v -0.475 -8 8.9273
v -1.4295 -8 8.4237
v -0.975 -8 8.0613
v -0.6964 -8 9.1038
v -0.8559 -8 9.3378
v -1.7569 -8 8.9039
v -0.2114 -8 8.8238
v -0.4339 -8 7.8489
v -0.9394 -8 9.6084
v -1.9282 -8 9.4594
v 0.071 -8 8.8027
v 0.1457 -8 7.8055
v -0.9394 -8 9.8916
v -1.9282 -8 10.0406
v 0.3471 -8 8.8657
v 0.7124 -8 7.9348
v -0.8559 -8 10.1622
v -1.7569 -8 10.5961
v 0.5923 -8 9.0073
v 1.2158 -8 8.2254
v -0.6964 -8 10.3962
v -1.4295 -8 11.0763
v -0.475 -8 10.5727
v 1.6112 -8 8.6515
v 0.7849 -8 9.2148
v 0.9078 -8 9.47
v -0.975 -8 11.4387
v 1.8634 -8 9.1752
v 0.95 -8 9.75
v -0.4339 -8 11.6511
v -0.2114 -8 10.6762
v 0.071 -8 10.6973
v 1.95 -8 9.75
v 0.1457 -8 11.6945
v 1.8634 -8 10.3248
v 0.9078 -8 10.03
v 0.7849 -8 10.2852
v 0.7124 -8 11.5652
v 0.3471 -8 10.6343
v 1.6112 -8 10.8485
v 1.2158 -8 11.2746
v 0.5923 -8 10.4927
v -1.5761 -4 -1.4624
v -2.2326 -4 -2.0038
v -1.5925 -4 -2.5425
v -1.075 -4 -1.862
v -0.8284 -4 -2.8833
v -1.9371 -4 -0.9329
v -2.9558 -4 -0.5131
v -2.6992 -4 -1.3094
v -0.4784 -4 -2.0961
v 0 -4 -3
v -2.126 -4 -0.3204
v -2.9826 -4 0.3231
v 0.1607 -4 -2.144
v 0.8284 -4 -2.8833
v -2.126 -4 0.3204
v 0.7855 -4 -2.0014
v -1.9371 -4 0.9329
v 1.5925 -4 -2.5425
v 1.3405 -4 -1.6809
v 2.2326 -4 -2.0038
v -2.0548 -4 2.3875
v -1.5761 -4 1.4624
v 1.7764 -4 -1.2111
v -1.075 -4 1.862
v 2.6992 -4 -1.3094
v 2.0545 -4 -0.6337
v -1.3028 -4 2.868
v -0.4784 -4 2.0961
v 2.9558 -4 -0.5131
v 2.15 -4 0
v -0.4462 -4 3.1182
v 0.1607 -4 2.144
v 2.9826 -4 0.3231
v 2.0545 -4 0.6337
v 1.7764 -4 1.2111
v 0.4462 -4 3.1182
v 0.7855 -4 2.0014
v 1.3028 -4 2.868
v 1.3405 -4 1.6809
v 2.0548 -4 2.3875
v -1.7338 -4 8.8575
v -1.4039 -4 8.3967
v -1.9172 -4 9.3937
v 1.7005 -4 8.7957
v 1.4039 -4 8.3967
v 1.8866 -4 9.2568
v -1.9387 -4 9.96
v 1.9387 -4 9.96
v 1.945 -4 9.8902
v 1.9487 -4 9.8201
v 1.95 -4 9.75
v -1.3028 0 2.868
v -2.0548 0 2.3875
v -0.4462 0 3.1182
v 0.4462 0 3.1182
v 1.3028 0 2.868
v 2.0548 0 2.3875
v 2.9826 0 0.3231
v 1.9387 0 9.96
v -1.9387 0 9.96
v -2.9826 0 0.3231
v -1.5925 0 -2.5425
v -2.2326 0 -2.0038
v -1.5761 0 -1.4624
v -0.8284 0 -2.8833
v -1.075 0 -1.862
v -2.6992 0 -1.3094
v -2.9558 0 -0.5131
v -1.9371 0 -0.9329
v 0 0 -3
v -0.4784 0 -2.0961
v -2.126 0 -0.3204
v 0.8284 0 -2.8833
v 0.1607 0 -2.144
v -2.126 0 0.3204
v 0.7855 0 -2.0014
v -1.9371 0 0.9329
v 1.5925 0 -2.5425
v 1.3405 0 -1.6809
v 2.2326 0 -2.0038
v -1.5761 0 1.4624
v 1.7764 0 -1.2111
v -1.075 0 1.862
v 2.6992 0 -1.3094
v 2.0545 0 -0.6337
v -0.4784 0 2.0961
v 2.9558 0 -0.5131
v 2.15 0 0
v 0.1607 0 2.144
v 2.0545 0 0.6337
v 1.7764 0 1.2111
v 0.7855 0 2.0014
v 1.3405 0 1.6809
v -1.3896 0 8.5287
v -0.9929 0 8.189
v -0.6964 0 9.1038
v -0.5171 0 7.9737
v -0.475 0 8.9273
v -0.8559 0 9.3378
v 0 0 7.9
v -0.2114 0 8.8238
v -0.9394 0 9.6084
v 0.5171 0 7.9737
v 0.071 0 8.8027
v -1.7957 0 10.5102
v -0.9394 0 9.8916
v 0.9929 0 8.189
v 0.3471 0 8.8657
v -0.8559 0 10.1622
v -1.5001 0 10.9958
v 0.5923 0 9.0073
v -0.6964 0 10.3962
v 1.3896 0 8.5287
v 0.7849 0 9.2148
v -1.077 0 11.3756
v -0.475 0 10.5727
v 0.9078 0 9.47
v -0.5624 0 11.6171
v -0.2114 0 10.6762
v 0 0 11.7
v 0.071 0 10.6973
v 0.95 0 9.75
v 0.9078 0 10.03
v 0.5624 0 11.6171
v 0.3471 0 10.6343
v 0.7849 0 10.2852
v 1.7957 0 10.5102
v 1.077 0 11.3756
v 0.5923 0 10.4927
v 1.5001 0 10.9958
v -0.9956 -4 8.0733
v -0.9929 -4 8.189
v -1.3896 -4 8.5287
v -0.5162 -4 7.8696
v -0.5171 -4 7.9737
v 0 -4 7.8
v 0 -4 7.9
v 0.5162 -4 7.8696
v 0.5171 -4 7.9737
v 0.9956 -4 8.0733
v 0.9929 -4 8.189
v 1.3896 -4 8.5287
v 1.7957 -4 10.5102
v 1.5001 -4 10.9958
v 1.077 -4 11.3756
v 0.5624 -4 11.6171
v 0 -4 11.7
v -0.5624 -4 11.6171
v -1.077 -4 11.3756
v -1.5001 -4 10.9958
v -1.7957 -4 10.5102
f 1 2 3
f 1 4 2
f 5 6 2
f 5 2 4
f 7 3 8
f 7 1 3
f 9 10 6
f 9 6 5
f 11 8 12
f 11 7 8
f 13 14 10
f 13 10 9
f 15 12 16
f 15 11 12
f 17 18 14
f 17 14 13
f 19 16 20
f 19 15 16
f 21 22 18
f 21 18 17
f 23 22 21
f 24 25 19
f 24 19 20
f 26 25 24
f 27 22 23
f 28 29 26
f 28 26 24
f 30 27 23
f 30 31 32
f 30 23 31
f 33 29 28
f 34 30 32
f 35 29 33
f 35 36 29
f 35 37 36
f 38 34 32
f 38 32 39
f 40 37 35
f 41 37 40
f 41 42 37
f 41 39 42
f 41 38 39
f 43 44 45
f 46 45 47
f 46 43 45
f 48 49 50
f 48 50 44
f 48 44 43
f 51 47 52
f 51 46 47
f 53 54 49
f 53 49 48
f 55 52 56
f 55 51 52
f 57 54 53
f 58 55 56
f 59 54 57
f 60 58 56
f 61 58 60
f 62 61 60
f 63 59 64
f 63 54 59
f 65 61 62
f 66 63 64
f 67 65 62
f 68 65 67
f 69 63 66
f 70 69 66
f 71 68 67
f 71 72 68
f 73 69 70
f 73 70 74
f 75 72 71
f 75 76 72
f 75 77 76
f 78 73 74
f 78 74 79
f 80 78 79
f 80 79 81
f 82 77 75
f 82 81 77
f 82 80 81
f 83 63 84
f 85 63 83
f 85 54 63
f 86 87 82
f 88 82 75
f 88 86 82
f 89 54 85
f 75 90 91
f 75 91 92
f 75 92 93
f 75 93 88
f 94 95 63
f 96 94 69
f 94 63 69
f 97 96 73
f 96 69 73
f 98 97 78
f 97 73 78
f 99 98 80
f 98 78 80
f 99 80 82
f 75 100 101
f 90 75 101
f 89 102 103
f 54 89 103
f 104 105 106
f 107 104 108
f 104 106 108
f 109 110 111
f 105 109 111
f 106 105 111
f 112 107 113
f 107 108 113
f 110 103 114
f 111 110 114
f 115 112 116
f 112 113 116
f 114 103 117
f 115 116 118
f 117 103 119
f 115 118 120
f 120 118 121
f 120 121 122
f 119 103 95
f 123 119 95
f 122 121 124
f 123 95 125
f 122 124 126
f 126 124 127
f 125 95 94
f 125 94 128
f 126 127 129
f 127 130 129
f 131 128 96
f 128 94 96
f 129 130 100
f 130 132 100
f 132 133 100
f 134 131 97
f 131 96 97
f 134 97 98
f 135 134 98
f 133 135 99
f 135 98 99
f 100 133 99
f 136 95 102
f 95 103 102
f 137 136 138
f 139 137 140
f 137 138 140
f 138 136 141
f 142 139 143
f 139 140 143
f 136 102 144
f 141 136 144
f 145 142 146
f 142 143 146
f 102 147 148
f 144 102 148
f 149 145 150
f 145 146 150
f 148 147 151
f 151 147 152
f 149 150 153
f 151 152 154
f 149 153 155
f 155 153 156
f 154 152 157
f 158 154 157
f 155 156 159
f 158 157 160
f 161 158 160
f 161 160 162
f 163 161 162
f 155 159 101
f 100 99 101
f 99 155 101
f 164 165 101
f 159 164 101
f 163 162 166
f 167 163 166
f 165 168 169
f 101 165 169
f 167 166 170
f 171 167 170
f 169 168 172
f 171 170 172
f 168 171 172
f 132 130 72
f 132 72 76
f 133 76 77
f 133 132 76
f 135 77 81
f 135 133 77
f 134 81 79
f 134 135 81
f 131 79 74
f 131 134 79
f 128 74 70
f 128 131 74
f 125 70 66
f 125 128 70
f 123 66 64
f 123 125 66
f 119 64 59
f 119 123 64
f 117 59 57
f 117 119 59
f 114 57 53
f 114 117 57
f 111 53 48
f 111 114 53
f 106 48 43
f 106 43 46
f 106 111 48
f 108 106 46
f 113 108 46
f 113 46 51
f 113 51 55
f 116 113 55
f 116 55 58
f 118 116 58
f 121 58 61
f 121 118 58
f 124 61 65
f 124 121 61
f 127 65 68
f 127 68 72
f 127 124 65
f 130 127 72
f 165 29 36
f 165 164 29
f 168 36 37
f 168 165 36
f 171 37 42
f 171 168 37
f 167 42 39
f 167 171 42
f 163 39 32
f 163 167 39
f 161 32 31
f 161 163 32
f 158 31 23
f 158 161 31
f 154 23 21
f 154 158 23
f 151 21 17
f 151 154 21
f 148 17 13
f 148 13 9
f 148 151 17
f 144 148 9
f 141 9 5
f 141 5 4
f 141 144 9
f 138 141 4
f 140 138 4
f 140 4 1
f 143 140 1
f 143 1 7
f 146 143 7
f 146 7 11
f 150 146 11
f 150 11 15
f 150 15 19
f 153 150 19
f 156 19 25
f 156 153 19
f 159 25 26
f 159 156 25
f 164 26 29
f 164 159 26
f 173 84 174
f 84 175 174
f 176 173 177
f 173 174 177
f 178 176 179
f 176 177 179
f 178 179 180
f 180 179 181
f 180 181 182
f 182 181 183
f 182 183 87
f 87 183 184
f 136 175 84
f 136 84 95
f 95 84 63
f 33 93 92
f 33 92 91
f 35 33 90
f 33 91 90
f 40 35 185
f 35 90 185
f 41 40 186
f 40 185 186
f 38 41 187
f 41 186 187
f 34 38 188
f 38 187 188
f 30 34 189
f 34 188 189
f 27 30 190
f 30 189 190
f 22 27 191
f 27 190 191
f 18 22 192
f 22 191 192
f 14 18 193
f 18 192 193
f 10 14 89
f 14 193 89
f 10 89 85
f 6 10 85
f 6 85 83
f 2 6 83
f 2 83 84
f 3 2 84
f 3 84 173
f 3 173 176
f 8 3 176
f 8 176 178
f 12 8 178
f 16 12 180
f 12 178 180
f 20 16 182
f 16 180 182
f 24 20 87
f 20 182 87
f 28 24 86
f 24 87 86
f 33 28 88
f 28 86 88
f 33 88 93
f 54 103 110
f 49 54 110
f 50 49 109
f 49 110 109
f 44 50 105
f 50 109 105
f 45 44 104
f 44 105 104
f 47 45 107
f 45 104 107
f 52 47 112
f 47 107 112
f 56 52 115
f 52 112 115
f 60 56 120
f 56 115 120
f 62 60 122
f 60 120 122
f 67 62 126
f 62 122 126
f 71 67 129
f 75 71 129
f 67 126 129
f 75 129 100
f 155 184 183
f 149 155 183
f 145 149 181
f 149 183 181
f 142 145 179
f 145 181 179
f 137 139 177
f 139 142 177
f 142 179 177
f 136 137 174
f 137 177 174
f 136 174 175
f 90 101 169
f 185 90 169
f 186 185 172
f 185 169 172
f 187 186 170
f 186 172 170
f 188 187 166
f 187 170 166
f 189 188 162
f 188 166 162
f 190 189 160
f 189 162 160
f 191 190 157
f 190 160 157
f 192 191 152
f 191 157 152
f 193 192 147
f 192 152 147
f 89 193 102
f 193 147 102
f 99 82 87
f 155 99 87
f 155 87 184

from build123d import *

# Parameters (mm, degrees)
F0_R     = 2.15
F0_R_2   = 0.95
F1_DEPTH = 4
F3_DEPTH = 25
F4_R     = 1.95
F4_R_2   = 0.95
F5_DEPTH = 4


with BuildPart() as f1:
    # F0 (on Front) → F1 (new body)
    with BuildSketch(Plane.XZ):
        with BuildLine():
            Line((-1.9386593306, 9.96), (-2.9825528163, 0.3230769231))
            ThreePointArc((-2.9825528163, 0.3230769231), (0, -3), (2.9825528163, 0.3230769231))
            Line((2.9825528163, 0.3230769231), (1.9386593306, 9.96))
            ThreePointArc((1.9386593306, 9.96), (0, 11.7), (-1.9386593306, 9.96))
        make_face()
        Circle(F0_R, mode=Mode.SUBTRACT)
        with Locations((0, 9.75)):
            Circle(F0_R_2, mode=Mode.SUBTRACT)
    extrude(amount=F1_DEPTH)

    # F2 (on face) → F3 (cut)
    with BuildSketch(Plane.XZ.offset(4)):
        with BuildLine():
            ThreePointArc((1.3896030661, 8.5287288103), (0, 7.9), (-1.3896030661, 8.5287288103))
            Line((-1.3896030661, 8.5287288103), (-2.0548350523, 2.3874993))
            ThreePointArc((-2.0548350523, 2.3874993), (0, 3.15), (2.0548350523, 2.3874993))
            Line((2.0548350523, 2.3874993), (1.3896030661, 8.5287288103))
        make_face()
    extrude(amount=-F3_DEPTH, mode=Mode.SUBTRACT)

    # F4 (on face) → F5 (join)
    with BuildSketch(Plane.XZ.offset(4)):
        with Locations((0, 9.75)):
            Circle(F4_R)
        with Locations((0, 9.75)):
            Circle(F4_R_2, mode=Mode.SUBTRACT)
    extrude(amount=F5_DEPTH)


solid = f1.part
